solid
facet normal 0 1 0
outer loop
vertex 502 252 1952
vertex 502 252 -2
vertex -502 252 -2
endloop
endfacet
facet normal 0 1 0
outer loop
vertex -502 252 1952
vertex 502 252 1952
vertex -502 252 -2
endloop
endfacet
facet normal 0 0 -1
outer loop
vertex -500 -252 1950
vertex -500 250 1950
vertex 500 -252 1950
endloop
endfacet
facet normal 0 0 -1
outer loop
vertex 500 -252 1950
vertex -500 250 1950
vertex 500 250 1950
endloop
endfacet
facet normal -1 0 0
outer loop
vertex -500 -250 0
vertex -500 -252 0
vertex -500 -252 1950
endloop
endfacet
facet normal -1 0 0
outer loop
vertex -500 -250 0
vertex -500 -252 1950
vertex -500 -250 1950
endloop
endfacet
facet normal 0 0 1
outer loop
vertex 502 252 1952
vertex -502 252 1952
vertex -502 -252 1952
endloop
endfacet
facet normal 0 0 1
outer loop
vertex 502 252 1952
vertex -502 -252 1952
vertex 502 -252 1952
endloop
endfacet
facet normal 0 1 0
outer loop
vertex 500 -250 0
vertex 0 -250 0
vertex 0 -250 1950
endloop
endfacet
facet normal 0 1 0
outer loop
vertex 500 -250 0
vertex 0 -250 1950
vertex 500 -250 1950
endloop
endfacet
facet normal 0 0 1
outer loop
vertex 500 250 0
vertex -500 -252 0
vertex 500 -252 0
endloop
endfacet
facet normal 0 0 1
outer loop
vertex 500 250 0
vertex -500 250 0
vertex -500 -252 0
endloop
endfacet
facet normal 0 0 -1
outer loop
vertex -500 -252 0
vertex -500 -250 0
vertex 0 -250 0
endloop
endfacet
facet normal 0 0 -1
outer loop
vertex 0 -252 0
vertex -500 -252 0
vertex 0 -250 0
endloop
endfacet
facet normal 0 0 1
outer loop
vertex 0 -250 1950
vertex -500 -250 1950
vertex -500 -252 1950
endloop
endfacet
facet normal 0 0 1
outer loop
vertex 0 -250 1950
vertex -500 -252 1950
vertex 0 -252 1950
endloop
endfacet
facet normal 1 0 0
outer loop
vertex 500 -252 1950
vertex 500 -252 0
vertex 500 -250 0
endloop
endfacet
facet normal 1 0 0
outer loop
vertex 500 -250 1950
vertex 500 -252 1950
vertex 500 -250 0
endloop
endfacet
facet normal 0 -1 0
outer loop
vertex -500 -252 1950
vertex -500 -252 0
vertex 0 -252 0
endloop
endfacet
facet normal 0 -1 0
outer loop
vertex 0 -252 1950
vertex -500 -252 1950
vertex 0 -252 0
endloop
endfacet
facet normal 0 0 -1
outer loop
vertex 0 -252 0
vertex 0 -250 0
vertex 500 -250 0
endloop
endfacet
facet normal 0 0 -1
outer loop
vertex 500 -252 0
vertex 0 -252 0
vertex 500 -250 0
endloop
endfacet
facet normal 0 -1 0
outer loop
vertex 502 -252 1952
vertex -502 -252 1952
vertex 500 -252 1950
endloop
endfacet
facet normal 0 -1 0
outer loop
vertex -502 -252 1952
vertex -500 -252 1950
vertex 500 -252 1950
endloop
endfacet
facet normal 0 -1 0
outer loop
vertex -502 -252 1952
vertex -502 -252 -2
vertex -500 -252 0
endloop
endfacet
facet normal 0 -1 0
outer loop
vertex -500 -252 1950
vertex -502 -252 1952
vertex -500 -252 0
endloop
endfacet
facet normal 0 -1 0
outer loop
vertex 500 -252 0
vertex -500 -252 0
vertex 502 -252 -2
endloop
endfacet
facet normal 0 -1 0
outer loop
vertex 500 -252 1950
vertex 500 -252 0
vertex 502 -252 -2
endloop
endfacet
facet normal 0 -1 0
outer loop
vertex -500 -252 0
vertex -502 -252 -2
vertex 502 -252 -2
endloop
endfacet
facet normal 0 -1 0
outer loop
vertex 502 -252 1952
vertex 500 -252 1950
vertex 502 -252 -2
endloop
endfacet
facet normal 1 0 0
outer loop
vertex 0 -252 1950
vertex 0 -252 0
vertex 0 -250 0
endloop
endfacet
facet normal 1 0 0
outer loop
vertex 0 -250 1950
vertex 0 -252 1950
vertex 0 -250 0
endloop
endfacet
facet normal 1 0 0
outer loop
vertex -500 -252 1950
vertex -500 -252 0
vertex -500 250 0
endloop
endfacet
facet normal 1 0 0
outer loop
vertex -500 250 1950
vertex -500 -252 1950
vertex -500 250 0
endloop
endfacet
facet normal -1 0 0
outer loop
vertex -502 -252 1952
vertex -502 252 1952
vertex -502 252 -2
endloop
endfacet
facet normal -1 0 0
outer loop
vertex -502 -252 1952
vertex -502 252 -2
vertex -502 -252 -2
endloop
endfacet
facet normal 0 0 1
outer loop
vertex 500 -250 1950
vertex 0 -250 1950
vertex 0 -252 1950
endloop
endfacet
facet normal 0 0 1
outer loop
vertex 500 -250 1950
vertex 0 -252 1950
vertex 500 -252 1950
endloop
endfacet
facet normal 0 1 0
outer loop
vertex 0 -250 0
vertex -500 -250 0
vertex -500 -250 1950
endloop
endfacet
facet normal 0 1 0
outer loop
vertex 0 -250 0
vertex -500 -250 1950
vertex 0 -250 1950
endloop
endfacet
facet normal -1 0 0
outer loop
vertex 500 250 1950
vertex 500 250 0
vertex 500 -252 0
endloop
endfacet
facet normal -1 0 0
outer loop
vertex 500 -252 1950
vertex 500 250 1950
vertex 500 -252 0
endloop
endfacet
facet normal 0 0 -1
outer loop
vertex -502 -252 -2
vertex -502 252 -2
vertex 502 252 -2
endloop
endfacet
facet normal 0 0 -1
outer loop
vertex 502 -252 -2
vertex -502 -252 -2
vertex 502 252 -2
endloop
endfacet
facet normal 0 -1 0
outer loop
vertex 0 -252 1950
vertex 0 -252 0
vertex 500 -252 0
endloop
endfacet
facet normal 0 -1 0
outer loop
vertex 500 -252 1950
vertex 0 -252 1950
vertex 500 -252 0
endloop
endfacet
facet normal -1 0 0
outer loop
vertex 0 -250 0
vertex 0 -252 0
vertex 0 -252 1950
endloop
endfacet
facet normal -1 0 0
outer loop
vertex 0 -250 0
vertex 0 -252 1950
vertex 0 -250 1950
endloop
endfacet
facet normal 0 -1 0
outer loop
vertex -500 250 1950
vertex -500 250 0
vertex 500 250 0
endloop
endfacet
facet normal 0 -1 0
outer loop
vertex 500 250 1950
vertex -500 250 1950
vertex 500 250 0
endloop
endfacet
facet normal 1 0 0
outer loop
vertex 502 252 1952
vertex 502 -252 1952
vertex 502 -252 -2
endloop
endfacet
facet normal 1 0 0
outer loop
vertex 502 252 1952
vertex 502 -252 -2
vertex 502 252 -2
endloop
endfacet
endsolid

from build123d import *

# Parameters (mm, degrees)
F0_W     = 500
F0_H     = 2
F1_DEPTH = 2
F2_DEPTH = 1950
F3_W     = 1000
F3_H     = 502
F4_DEPTH = 2
F5_DEPTH = 1950
F6_DEPTH = 1950


with BuildPart() as f1:
    # F0 (on Top) → F1 (new body)
    with BuildSketch(Plane.XY):
        Polygon((500, -250), (500, 250), (-500, 250), (-500, -250), (0, -250), align=None)
        Polygon((-500, 250), (500, 250), (500, -250), (500, -252), (502, -252), (502, 252), (-502, 252), (-502, -252), (-500, -252), (-500, -250), align=None)
        with Locations((250, -251)):
            Rectangle(F0_W, F0_H)
        with Locations((-250, -251)):
            Rectangle(F0_W, F0_H)
    extrude(amount=-F1_DEPTH)

    # F0 (on Top) → F2 (join)
    with BuildSketch(Plane.XY):
        Polygon((-500, 250), (500, 250), (500, -250), (500, -252), (502, -252), (502, 252), (-502, 252), (-502, -252), (-500, -252), (-500, -250), align=None)
    extrude(amount=F2_DEPTH)

    # F3 (on face) → F4 (join)
    with BuildSketch(Plane.XY.offset(1950)):
        Polygon((-502, 252), (-502, -252), (-500, -252), (-500, 250), (500, 250), (500, -252), (502, -252), (502, 252), align=None)
        with Locations((0, -1)):
            Rectangle(F3_W, F3_H)
    extrude(amount=F4_DEPTH)


with BuildPart() as f5:
    # F0 (on Top) → F5 (new body, through all)
    with BuildSketch(Plane.XY):
        with Locations((-250, -251)):
            Rectangle(F0_W, F0_H)
    extrude(amount=F5_DEPTH)


with BuildPart() as f6:
    # F0 (on Top) → F6 (new body, through all)
    with BuildSketch(Plane.XY):
        with Locations((250, -251)):
            Rectangle(F0_W, F0_H)
    extrude(amount=F6_DEPTH)


solid = Compound([f1.part, f5.part, f6.part])
